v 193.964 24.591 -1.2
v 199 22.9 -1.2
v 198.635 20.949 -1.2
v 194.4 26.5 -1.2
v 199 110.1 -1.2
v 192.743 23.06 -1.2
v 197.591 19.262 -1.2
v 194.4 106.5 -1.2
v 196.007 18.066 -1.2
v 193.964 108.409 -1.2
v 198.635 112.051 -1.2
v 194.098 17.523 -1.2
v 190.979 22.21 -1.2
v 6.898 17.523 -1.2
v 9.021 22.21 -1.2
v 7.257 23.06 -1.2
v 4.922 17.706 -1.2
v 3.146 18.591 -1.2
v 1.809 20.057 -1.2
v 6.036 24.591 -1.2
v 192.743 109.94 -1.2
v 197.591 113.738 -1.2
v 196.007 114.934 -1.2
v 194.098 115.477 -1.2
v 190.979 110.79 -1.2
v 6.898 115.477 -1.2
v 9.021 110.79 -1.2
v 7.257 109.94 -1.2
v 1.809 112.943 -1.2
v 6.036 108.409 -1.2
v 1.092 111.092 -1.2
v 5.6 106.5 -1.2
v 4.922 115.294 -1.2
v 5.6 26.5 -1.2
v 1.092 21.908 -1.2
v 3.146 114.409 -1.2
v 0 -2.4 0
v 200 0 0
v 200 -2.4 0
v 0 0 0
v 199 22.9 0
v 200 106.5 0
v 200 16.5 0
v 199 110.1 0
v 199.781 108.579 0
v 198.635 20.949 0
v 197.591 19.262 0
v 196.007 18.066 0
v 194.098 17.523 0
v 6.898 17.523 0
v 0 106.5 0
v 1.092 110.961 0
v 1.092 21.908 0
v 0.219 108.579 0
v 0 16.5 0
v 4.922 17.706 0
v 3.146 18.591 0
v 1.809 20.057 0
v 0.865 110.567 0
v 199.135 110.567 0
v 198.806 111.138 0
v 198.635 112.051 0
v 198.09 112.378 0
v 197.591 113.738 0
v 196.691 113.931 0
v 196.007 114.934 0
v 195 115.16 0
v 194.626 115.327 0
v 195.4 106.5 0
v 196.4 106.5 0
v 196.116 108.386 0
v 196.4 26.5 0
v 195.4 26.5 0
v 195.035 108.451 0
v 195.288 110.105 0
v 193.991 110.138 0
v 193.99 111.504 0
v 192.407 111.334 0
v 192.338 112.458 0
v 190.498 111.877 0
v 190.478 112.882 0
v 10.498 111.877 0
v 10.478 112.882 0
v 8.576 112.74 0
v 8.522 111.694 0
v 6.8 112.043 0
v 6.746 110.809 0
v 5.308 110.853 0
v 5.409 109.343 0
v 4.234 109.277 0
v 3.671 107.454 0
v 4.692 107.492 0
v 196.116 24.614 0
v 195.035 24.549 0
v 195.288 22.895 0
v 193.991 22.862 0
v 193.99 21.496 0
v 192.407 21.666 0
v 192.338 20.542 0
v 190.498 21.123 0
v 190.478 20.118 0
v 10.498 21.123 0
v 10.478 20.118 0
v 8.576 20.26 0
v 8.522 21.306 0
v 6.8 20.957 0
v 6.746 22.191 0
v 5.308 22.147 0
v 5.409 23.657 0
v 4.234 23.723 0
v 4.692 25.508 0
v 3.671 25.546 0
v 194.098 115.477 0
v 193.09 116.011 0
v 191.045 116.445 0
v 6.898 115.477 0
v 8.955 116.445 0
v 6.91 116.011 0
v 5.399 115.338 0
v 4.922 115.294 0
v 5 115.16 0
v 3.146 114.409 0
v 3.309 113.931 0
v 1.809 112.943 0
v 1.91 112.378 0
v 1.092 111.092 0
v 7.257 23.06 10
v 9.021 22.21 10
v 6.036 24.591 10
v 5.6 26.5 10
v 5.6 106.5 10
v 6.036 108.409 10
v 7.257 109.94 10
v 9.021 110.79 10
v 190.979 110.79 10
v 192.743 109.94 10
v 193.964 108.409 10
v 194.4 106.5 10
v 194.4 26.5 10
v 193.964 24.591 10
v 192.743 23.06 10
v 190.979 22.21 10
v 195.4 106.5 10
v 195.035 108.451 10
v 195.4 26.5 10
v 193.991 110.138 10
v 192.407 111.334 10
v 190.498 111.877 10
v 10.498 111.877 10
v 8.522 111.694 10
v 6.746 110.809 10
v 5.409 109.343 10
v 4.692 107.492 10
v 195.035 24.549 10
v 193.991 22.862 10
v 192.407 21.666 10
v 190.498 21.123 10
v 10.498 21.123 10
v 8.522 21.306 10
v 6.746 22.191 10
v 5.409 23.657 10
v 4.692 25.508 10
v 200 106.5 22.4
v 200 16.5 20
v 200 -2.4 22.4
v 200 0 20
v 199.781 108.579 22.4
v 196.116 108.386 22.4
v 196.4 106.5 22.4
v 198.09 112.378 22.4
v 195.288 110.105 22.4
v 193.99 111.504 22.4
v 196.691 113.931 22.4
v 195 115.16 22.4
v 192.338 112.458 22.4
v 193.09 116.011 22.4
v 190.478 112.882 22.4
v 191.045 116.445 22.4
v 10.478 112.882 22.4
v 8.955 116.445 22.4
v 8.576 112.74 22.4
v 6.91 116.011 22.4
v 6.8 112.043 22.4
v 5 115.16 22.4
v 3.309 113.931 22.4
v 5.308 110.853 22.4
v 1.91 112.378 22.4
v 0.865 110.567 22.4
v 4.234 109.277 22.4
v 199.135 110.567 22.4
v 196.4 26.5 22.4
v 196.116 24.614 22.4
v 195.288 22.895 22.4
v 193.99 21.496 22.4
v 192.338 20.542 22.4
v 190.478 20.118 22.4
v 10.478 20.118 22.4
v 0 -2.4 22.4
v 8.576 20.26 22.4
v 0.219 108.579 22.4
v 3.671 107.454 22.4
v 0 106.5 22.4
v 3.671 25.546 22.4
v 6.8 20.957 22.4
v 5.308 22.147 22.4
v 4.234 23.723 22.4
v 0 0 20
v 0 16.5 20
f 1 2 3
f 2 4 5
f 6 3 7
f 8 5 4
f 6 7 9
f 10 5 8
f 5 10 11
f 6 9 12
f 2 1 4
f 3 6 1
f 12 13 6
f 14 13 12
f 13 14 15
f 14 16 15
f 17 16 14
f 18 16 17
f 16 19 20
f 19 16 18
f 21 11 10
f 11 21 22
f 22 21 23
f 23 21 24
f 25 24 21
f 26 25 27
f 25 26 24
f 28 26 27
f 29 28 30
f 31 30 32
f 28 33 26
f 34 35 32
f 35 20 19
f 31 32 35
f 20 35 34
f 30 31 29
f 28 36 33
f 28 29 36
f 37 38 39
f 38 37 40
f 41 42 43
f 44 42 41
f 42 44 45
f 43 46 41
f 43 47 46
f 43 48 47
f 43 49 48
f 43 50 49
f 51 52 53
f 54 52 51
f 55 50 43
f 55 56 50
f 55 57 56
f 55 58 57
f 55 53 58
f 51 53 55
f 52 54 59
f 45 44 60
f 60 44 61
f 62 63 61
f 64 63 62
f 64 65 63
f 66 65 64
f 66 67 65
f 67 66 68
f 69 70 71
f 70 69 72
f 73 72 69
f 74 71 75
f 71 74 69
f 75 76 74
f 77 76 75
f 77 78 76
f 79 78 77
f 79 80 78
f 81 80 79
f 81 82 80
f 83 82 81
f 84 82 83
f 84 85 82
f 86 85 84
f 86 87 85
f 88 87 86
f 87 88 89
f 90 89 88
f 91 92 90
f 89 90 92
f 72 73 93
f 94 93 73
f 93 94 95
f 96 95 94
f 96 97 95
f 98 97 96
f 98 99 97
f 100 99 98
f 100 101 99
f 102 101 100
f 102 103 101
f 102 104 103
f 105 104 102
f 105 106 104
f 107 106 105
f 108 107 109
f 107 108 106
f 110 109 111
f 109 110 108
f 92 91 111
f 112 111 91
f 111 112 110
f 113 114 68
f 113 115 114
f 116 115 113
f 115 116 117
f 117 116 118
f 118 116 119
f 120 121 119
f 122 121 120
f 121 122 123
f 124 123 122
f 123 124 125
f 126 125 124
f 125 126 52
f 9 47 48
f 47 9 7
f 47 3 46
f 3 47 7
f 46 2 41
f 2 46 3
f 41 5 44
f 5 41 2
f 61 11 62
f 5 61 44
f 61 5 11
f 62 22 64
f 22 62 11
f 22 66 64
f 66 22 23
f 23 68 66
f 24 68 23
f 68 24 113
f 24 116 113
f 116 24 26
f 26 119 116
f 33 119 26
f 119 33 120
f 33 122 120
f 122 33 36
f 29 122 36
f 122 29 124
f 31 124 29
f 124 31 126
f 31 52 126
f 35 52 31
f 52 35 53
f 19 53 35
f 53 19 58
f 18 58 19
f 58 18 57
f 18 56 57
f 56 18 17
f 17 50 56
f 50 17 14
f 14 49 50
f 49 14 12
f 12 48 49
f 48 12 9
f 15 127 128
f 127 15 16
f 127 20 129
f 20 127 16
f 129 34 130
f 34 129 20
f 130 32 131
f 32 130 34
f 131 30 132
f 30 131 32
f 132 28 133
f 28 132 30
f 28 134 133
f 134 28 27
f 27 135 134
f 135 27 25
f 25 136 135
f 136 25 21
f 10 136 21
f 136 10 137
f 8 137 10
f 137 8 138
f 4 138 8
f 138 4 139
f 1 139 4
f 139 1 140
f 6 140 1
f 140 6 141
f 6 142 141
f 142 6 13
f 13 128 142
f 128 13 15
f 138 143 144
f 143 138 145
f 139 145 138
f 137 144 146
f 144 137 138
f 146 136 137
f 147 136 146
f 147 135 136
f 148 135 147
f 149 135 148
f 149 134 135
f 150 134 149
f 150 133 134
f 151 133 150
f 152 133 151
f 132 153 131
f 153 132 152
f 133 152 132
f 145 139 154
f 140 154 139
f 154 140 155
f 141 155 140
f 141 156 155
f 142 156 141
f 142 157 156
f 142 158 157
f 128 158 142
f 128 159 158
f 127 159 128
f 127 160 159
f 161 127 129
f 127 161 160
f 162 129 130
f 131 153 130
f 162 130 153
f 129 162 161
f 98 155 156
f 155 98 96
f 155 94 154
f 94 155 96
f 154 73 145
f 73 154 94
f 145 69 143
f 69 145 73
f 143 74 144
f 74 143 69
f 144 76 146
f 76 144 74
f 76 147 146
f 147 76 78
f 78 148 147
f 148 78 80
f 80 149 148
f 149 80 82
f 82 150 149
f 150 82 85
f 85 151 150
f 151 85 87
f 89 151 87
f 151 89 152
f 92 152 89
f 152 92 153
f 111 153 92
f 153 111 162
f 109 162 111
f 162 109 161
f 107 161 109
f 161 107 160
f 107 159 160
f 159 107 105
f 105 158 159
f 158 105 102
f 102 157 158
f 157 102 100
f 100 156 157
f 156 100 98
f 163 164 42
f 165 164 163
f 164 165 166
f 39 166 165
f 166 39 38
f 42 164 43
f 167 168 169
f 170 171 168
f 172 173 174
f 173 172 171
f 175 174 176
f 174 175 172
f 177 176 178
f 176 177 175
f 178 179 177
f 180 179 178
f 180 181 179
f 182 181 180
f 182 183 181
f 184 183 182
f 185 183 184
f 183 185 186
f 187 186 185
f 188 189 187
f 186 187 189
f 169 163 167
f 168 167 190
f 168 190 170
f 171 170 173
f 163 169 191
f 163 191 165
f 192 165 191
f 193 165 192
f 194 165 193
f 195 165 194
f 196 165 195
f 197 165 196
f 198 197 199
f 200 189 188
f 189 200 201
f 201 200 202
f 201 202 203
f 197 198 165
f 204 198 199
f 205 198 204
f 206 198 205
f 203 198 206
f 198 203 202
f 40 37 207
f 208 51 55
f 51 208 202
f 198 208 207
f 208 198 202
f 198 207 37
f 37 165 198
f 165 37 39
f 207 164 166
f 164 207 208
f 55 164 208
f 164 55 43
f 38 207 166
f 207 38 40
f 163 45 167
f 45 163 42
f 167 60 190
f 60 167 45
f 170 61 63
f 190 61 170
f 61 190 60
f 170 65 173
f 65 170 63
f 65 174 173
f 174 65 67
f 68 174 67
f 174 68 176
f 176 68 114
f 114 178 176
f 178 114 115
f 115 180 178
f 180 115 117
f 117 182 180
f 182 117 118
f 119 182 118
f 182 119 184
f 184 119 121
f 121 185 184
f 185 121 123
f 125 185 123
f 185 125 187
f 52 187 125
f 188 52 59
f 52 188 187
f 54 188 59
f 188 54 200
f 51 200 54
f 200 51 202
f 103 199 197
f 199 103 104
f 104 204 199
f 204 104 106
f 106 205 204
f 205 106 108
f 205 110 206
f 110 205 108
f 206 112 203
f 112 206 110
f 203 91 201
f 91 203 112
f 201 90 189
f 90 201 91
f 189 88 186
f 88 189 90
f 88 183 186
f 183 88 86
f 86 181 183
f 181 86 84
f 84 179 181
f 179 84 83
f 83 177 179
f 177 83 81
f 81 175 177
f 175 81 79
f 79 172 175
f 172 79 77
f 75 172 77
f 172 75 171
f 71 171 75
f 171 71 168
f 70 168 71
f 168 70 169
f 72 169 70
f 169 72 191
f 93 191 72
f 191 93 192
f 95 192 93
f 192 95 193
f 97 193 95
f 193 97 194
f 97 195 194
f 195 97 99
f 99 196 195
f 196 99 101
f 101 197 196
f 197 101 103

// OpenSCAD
door_width = 16.5;
clip_width = 2.4;
holder_width = 3.6;
corner_r = 10;
border_gap = 1;
border_width = 1;


translate([holder_width+border_gap,door_width+holder_width+border_gap,0]) {
    
    translate([0,0,-1.2])
    linear_extrude(1.2)
    difference(){
        translate([-holder_width,-holder_width,0])
        round_corner(200-holder_width*2-border_gap*2+holder_width*2,
                    100-holder_width*2-border_gap*2+holder_width*2,
                    corner_r-holder_width-border_gap);
        translate([border_width,border_width,0])
        round_corner(200-holder_width*2-border_gap*2-border_width*2,
                    100-holder_width*2-border_gap*2-border_width*2,
                    corner_r-holder_width-border_gap-border_width);
    }
    
    linear_extrude(10)
    difference(){
        round_corner(200-holder_width*2-border_gap*2,
                    100-holder_width*2-border_gap*2,
                    corner_r-holder_width-border_gap);
        translate([border_width,border_width,0])
        round_corner(200-holder_width*2-border_gap*2-border_width*2,
                    100-holder_width*2-border_gap*2-border_width*2,
                    corner_r-holder_width-border_gap-border_width);
    }
 }




difference(){
    translate([0,-clip_width,0]) cube([200,door_width+clip_width*2,20+clip_width]);
    cube([200,door_width,20]);
}

translate([0,door_width,0])
linear_extrude(20+clip_width)
difference(){
    union(){
        round_corner(200,100,corner_r);
        square([200,holder_width]);
        square([holder_width,50]);
        translate([200-holder_width,0,0]) square([holder_width,50]);
    }
    translate([holder_width,holder_width,0])
        round_corner(200-holder_width*2,100-holder_width*2,corner_r-holder_width);
    
}

module round_corner(x, y, r){
    translate([r,r,0]) minkowski() {
        circle(r);
        square([x-r*2,y-r*2]);
    }
}
//cube([100, 200, 20]);
